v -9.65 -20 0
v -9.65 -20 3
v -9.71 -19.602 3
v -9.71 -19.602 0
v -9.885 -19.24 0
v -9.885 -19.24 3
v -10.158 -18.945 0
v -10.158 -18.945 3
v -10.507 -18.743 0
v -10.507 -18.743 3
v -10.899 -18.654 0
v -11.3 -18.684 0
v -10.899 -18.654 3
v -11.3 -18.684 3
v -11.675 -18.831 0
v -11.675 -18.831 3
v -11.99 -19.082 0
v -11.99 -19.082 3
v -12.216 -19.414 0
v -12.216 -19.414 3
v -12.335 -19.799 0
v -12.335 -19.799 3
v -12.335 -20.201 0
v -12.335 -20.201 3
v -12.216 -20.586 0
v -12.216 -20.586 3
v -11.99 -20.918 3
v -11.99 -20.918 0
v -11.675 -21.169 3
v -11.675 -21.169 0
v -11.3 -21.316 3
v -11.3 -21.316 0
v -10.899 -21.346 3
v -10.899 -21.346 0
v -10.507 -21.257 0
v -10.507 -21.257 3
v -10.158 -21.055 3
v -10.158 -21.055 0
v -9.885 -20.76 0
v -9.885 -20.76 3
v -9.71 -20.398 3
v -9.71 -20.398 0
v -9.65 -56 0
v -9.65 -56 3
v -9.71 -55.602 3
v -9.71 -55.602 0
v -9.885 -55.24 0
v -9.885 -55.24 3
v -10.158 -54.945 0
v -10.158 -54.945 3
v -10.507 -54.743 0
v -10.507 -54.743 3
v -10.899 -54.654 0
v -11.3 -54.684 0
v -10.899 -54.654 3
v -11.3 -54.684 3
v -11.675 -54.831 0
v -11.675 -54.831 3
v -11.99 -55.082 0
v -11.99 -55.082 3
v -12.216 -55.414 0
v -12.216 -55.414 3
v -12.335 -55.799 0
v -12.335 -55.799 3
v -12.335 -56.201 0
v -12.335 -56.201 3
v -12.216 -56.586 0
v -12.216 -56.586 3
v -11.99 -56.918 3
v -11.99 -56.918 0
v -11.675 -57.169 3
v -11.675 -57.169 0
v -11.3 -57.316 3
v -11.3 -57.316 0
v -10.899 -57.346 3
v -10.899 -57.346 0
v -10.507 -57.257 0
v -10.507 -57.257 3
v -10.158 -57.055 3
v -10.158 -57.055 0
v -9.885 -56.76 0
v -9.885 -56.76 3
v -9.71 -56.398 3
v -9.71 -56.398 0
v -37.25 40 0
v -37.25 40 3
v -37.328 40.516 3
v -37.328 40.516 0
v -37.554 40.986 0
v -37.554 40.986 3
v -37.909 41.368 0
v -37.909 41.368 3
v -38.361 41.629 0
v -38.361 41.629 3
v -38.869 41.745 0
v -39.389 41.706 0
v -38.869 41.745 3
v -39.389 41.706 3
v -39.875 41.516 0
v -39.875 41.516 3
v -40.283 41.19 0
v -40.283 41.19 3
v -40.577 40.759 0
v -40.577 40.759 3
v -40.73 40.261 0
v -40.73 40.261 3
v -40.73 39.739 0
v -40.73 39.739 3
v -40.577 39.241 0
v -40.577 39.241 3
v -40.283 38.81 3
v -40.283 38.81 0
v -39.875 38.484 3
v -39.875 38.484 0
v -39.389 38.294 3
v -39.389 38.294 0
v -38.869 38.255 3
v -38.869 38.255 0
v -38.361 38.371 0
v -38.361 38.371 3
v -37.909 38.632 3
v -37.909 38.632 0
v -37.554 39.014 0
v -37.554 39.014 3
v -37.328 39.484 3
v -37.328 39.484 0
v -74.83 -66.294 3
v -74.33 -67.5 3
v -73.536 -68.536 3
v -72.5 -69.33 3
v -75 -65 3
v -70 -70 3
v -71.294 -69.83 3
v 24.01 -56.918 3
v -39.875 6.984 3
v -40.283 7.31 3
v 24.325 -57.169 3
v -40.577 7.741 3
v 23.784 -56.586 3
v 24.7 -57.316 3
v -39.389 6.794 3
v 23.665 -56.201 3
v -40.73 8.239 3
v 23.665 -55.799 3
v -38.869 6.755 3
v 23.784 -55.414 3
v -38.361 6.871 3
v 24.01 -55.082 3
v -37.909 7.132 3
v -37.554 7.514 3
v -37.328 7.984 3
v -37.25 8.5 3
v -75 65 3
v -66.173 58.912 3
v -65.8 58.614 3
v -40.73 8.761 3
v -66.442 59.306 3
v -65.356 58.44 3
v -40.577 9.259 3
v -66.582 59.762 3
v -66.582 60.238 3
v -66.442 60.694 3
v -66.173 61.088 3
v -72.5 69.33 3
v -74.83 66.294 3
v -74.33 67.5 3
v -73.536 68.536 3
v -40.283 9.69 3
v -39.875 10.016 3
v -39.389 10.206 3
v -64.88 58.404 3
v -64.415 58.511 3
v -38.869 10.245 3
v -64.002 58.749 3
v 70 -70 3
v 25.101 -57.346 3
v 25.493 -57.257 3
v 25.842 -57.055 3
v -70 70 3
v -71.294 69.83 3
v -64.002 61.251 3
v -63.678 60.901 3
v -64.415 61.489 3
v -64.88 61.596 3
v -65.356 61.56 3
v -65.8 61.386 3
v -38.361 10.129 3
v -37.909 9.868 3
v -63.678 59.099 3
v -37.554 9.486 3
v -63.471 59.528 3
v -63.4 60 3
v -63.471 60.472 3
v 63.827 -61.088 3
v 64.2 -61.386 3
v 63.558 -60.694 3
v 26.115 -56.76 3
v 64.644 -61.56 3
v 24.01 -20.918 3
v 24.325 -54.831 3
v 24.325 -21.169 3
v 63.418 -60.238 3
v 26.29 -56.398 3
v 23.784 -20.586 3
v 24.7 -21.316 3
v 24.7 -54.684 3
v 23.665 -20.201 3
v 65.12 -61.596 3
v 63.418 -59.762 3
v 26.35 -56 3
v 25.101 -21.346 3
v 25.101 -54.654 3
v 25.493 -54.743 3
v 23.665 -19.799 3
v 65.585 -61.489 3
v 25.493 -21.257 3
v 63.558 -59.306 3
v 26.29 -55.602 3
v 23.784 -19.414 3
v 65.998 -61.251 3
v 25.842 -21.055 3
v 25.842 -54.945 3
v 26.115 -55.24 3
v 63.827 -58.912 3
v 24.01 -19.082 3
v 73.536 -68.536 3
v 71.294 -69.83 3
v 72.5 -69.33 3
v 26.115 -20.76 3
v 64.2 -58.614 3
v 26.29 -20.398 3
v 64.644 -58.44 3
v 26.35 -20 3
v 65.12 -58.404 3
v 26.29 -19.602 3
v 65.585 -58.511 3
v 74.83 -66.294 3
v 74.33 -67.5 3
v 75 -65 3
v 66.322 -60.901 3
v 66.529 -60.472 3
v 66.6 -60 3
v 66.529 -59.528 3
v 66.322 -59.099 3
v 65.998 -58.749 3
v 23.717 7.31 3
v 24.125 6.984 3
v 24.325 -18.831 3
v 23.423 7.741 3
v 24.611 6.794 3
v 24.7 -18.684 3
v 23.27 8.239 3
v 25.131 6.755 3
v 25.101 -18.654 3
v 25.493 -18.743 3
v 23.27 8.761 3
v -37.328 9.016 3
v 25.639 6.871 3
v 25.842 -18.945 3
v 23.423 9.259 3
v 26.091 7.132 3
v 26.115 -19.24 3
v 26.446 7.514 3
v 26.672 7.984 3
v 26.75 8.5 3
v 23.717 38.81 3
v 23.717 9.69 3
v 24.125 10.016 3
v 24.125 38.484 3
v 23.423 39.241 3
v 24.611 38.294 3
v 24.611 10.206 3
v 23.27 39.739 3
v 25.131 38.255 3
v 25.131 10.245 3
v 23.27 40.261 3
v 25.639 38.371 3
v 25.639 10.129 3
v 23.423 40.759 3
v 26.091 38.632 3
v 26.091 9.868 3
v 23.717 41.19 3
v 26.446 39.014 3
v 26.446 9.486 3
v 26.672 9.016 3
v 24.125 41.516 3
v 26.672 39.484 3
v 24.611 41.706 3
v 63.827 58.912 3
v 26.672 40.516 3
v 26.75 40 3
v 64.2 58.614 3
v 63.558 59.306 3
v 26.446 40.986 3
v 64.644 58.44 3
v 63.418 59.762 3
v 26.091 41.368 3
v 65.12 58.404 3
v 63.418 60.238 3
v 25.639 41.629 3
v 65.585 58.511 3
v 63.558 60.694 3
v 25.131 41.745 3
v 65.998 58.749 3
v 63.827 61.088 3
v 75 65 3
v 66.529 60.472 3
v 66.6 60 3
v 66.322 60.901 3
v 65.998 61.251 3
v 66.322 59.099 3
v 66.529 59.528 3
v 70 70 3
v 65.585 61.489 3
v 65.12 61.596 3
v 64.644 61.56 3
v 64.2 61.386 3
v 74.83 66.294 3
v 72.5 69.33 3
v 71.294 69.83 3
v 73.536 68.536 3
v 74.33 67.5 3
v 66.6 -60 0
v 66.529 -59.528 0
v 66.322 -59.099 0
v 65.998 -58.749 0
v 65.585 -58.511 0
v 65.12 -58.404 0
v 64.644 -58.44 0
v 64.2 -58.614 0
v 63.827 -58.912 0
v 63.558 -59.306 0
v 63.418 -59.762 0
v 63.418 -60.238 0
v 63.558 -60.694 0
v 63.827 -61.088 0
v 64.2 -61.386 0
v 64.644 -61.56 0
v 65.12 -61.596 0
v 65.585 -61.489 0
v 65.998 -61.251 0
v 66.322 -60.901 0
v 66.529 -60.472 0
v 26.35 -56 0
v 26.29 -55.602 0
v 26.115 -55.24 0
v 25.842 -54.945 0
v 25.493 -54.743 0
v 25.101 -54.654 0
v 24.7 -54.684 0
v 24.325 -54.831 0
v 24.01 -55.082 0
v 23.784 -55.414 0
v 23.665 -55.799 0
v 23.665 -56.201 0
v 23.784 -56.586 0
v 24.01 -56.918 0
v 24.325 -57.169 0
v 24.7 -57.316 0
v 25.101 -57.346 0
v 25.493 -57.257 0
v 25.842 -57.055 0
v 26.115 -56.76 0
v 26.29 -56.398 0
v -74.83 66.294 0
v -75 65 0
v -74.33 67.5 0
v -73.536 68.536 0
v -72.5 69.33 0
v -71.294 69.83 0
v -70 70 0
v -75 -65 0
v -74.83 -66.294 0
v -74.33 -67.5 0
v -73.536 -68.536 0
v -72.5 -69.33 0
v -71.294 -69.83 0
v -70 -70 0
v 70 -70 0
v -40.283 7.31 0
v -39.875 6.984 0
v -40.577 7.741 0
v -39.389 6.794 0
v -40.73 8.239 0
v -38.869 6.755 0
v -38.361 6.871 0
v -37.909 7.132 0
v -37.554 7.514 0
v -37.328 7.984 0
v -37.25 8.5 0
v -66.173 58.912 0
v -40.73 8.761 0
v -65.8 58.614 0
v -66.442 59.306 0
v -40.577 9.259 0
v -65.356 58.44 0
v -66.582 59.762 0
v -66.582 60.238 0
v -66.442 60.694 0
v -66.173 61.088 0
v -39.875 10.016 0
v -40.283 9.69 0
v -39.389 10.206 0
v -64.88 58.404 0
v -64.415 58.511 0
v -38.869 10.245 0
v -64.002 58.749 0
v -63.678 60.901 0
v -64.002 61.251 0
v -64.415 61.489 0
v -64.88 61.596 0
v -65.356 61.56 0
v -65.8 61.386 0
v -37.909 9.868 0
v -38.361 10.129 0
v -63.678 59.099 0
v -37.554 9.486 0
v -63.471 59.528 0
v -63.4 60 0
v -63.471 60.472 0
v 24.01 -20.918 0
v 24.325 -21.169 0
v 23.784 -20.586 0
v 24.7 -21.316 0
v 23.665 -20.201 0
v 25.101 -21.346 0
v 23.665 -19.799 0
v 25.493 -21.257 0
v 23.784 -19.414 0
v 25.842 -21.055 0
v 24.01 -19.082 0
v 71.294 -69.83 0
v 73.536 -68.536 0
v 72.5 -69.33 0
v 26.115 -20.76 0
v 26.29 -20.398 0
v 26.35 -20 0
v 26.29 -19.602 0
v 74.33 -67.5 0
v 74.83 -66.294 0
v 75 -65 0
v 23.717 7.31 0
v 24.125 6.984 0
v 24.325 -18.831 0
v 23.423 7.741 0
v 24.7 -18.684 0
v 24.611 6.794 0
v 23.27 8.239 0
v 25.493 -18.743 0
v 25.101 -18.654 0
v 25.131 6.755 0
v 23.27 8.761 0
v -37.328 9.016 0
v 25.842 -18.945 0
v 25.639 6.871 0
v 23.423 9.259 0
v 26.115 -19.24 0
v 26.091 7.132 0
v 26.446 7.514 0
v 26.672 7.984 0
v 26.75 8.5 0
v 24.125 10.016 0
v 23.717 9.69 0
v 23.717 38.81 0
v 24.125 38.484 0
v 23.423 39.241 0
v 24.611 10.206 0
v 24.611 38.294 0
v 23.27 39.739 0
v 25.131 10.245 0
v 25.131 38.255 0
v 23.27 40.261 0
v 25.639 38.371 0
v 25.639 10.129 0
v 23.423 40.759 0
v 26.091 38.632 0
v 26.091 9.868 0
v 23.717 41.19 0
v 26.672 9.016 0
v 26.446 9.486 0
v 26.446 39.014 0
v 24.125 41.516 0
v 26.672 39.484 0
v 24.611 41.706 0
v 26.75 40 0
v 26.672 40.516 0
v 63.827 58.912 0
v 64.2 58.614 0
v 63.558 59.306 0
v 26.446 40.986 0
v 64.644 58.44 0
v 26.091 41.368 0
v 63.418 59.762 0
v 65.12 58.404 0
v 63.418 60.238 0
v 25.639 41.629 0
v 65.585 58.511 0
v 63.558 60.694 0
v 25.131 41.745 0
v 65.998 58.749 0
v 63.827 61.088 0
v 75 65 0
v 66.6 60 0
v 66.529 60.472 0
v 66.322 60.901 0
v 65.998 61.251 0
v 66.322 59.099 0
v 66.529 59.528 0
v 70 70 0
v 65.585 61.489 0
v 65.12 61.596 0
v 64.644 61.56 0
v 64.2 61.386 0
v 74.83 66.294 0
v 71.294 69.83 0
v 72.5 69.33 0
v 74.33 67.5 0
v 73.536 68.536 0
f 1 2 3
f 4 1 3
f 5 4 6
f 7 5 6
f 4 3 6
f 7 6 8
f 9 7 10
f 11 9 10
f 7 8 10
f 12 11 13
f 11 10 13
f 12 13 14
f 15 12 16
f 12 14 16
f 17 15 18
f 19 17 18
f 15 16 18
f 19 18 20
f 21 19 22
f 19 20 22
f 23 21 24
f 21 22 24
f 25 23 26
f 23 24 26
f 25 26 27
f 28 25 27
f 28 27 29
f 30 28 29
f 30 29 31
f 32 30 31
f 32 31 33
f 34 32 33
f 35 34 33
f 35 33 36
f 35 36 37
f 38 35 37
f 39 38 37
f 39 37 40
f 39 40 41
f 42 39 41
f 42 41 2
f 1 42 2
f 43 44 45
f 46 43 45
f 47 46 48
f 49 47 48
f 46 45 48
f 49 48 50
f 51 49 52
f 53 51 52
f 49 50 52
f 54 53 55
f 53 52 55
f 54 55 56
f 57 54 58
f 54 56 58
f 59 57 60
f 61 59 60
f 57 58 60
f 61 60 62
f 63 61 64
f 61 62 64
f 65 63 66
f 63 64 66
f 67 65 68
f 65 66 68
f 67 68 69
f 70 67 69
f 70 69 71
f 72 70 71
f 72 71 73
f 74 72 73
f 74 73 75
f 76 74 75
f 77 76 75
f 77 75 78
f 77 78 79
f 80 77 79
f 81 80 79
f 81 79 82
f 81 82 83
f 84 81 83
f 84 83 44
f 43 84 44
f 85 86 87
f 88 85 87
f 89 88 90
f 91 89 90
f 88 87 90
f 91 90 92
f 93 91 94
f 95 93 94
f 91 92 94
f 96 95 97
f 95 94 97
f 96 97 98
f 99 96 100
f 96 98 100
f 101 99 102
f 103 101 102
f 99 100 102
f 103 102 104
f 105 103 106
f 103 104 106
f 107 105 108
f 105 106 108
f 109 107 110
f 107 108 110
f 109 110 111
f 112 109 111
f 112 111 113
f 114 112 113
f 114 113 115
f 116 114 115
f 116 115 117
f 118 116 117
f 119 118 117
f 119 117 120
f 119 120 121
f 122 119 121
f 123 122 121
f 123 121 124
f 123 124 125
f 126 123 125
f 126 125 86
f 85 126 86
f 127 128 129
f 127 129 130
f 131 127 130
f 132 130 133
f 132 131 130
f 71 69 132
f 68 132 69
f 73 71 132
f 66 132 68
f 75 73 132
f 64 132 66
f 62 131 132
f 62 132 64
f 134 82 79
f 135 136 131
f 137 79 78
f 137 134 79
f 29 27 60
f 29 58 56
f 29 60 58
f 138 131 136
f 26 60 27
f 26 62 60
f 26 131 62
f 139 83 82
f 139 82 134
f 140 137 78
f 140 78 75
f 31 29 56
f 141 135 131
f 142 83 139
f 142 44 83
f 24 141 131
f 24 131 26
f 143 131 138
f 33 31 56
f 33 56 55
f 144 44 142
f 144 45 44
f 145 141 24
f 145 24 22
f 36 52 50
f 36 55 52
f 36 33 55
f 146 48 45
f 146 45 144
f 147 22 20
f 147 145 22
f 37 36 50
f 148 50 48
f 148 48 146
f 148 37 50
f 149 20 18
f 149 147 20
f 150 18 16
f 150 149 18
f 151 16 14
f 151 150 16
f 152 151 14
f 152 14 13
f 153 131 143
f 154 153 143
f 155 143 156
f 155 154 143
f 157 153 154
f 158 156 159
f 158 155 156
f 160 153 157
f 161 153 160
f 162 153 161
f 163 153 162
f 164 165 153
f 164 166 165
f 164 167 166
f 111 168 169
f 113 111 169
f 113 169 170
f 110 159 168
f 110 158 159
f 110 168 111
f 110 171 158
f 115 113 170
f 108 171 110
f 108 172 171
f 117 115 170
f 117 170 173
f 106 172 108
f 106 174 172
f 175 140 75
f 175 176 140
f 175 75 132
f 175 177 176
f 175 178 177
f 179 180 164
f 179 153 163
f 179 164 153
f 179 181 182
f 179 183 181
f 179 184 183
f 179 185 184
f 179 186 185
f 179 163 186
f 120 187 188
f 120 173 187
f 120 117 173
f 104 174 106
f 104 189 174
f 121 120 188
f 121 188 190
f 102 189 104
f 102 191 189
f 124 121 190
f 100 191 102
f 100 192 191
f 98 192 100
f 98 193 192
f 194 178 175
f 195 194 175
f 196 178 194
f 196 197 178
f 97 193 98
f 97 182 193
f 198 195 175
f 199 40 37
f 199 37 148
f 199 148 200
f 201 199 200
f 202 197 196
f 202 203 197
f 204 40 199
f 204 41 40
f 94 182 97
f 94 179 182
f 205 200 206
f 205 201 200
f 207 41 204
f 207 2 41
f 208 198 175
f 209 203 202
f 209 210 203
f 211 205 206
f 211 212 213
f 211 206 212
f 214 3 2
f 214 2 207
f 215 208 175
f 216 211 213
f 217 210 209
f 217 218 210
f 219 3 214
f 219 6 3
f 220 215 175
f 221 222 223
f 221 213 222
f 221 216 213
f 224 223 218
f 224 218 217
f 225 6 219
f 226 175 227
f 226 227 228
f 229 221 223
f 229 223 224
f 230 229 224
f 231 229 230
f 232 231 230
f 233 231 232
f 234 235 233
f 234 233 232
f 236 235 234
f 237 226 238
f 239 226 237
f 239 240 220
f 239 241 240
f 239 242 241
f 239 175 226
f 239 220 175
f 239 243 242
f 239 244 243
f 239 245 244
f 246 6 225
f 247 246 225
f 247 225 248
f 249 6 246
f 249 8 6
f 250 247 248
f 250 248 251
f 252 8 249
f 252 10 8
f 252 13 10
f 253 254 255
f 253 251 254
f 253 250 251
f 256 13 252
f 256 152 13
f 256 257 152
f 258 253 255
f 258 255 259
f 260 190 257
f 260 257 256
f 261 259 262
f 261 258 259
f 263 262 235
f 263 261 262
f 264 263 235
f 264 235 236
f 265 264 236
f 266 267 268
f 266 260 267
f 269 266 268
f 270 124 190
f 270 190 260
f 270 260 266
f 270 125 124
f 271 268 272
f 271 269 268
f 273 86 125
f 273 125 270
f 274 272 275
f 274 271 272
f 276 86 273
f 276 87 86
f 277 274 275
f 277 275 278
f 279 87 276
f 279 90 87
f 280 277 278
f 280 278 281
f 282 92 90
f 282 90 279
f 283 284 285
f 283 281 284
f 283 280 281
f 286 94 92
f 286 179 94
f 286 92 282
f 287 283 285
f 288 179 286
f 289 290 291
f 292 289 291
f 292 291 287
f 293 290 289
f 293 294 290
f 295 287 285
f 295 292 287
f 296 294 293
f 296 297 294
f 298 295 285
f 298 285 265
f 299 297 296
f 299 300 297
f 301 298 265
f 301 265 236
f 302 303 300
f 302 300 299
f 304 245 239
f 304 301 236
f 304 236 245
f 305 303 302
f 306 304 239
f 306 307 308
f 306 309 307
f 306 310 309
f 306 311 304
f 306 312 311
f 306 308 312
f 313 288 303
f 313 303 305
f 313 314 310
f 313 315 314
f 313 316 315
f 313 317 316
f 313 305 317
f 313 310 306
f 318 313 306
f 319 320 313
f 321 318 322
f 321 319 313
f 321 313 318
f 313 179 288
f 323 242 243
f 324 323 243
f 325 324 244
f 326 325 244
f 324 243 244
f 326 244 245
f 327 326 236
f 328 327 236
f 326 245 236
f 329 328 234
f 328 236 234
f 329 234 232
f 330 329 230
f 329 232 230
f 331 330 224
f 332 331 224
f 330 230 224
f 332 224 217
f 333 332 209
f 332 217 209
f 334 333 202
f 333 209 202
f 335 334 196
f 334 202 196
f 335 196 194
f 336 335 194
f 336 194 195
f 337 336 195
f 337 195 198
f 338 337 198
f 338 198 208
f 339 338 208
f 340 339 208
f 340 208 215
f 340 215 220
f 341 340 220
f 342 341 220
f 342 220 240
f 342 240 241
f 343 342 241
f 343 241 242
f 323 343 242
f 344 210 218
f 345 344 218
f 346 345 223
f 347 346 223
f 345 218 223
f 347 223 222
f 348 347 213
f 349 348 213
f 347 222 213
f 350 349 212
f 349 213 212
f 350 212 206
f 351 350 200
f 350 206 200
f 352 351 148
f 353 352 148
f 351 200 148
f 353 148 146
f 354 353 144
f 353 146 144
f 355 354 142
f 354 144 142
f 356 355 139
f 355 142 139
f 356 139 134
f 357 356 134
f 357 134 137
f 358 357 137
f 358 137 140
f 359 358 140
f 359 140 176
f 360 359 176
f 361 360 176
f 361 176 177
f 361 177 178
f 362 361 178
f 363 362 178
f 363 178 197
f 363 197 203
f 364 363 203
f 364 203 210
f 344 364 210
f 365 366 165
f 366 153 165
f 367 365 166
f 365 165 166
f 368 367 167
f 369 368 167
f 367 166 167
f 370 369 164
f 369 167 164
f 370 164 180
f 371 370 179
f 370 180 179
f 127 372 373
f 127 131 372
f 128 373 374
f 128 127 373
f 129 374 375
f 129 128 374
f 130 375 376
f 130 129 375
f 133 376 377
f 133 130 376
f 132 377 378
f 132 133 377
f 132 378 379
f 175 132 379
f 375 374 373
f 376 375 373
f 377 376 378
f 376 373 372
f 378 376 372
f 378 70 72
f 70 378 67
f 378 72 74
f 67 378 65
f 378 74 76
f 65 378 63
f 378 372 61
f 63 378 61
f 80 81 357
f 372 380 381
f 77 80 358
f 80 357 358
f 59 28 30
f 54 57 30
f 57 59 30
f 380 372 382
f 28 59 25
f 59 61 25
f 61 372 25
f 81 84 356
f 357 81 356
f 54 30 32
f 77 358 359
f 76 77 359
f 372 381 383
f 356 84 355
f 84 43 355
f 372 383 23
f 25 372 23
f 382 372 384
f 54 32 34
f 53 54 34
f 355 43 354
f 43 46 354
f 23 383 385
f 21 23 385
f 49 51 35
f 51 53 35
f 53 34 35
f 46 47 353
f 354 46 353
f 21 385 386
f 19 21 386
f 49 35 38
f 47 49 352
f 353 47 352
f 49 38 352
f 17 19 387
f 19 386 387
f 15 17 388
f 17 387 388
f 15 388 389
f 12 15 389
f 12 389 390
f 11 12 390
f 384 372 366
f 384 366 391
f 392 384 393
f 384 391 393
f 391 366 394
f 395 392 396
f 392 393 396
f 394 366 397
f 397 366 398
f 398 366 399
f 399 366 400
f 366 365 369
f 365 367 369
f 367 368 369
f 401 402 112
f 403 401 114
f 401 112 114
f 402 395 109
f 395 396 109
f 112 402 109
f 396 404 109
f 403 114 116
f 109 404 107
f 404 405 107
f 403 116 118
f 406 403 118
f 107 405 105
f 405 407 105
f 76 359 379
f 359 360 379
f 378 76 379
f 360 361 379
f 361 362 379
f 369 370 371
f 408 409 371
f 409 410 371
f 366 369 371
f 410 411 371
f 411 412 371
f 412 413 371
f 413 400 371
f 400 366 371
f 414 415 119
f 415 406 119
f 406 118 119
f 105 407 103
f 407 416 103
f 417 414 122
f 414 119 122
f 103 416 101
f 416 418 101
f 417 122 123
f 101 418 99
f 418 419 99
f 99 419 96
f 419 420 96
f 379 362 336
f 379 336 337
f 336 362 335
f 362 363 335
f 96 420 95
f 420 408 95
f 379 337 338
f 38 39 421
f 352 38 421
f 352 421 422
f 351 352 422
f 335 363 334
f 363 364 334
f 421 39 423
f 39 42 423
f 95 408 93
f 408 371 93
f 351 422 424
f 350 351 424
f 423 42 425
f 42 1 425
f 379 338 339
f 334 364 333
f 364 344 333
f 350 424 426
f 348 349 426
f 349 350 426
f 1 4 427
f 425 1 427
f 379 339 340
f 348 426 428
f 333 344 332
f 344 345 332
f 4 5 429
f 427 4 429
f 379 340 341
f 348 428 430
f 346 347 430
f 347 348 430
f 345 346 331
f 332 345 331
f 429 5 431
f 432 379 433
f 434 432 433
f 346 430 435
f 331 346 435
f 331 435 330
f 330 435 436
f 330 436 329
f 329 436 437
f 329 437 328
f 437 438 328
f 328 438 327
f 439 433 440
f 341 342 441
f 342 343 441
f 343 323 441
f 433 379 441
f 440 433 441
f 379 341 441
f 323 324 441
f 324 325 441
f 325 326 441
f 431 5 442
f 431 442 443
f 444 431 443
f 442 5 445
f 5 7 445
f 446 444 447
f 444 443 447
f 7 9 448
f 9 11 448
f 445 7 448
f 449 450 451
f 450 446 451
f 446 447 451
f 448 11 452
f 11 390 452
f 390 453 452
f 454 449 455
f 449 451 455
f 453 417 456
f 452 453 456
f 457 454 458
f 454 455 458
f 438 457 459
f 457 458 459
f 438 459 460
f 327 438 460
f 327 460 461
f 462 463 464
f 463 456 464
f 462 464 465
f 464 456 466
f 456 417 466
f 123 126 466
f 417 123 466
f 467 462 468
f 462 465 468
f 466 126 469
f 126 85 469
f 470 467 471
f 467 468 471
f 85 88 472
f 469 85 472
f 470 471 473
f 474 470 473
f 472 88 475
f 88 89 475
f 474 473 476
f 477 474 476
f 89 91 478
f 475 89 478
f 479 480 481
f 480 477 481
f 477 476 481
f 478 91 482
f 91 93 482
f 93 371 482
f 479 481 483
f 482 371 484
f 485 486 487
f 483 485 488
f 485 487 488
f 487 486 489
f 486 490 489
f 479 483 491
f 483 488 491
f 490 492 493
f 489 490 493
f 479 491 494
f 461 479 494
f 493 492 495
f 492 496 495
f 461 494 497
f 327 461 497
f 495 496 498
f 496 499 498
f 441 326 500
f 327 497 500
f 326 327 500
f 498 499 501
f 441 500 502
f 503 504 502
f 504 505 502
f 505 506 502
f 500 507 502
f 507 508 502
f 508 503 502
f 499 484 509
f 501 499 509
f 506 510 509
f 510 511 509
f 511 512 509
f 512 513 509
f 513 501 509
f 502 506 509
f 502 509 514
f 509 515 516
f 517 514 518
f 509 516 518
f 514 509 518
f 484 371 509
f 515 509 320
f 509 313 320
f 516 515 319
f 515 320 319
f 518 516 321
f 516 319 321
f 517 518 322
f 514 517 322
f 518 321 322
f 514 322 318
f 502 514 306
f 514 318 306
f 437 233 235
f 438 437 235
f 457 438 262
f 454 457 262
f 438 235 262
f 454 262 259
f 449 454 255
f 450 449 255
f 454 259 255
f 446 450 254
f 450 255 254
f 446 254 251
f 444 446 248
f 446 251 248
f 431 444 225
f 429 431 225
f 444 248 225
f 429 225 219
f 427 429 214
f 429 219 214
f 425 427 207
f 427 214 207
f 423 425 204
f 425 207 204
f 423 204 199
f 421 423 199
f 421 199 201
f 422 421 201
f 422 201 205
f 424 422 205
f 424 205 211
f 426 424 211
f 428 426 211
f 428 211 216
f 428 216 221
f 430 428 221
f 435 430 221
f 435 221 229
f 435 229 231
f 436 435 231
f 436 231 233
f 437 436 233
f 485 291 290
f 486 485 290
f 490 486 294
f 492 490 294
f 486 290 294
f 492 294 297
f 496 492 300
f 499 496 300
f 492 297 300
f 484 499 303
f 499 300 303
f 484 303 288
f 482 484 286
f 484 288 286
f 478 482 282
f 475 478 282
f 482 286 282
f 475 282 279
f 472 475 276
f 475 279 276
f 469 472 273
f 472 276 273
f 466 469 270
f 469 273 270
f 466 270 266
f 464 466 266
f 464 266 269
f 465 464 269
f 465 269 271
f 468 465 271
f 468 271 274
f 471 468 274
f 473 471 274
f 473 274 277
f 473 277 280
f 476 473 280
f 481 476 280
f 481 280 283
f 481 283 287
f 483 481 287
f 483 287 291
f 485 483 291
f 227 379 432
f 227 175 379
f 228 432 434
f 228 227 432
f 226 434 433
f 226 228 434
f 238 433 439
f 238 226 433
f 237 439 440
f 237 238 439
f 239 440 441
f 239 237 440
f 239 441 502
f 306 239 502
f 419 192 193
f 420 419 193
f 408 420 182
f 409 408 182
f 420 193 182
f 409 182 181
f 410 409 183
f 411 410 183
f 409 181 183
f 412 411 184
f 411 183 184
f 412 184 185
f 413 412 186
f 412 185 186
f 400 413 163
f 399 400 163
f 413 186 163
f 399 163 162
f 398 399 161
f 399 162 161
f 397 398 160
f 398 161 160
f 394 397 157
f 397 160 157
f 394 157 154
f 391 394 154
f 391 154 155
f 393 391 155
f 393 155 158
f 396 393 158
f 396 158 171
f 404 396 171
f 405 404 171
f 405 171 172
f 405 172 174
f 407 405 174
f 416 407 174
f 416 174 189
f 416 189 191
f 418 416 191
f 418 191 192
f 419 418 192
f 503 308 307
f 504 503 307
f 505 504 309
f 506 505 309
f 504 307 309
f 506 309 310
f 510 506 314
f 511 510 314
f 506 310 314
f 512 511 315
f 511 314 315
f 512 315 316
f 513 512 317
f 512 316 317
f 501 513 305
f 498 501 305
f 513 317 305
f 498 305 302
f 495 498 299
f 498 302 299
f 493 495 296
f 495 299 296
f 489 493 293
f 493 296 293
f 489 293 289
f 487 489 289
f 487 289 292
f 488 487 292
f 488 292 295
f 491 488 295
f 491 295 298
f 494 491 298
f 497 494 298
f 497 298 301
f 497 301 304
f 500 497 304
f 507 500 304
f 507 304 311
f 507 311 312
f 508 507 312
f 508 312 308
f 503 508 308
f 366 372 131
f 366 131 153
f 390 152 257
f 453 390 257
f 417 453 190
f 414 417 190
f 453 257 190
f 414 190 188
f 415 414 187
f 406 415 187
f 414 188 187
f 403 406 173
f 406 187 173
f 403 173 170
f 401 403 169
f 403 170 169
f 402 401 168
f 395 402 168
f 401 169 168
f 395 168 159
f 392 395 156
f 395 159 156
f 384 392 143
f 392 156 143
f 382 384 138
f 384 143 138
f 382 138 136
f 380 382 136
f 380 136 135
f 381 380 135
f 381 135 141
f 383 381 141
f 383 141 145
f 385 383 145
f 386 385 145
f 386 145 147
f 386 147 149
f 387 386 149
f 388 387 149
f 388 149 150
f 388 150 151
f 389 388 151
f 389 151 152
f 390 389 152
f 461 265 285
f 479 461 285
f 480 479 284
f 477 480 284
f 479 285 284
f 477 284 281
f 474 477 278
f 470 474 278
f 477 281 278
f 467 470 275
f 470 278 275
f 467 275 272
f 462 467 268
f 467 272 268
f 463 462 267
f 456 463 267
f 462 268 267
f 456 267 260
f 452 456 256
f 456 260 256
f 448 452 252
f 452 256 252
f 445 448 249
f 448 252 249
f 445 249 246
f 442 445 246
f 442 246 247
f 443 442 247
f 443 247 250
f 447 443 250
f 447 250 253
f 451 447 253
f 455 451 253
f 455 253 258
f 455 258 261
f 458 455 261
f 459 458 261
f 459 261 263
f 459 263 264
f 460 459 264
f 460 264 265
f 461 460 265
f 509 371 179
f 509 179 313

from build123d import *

# Parameters (mm, degrees)
SKETCH_1_W          = 150
SKETCH_1_H          = 140
EXTRUDE_1_DEPTH     = 3
SKETCH_3_R          = 1.75
CUT_EXTRUDE_1_DEPTH = 10
SKETCH_4_R          = 1.35
CUT_EXTRUDE_2_DEPTH = 10
SKETCH_5_R          = 1.6
CUT_EXTRUDE_3_DEPTH = 10
FILLET_1_R          = 5


with BuildPart() as part:
    # 草图1 → 凸台-拉伸1 (new body)
    with BuildSketch(Plane.XY):
        Rectangle(SKETCH_1_W, SKETCH_1_H)
    extrude(amount=EXTRUDE_1_DEPTH)

    # 草图3 → 切除-拉伸1 (cut)
    with BuildSketch(Plane.XY.offset(3)):
        with Locations((25, 40)):
            Circle(SKETCH_3_R)
        with Locations((-39, 40)):
            Circle(SKETCH_3_R)
        with Locations((25, 8.5)):
            Circle(SKETCH_3_R)
        with Locations((-39, 8.5)):
            Circle(SKETCH_3_R)
    extrude(amount=-CUT_EXTRUDE_1_DEPTH, mode=Mode.SUBTRACT)

    # 草图4 → 切除-拉伸2 (cut)
    with BuildSketch(Plane.XY.offset(3)):
        with Locations((25, -20)):
            Circle(SKETCH_4_R)
        with Locations((-11, -20)):
            Circle(SKETCH_4_R)
        with Locations((-11, -56)):
            Circle(SKETCH_4_R)
        with Locations((25, -56)):
            Circle(SKETCH_4_R)
    extrude(amount=-CUT_EXTRUDE_2_DEPTH, mode=Mode.SUBTRACT)

    # 草图5 → 切除-拉伸3 (cut)
    with BuildSketch(Plane.XY.offset(3)):
        with Locations((65, 60)):
            Circle(SKETCH_5_R)
        with Locations((-65, 60)):
            Circle(SKETCH_5_R)
        with Locations((65, -60)):
            Circle(SKETCH_5_R)
    extrude(amount=-CUT_EXTRUDE_3_DEPTH, mode=Mode.SUBTRACT)

    # 圆角1
    fillet_1_edges = [part.edges().sort_by_distance(p)[0] for p in [
        (75, -70, 1.5),
        (-75, -70, 1.5),
        (-75, 70, 1.5),
        (75, 70, 1.5),
    ]]
    fillet(fillet_1_edges, radius=FILLET_1_R)


solid = part.part
